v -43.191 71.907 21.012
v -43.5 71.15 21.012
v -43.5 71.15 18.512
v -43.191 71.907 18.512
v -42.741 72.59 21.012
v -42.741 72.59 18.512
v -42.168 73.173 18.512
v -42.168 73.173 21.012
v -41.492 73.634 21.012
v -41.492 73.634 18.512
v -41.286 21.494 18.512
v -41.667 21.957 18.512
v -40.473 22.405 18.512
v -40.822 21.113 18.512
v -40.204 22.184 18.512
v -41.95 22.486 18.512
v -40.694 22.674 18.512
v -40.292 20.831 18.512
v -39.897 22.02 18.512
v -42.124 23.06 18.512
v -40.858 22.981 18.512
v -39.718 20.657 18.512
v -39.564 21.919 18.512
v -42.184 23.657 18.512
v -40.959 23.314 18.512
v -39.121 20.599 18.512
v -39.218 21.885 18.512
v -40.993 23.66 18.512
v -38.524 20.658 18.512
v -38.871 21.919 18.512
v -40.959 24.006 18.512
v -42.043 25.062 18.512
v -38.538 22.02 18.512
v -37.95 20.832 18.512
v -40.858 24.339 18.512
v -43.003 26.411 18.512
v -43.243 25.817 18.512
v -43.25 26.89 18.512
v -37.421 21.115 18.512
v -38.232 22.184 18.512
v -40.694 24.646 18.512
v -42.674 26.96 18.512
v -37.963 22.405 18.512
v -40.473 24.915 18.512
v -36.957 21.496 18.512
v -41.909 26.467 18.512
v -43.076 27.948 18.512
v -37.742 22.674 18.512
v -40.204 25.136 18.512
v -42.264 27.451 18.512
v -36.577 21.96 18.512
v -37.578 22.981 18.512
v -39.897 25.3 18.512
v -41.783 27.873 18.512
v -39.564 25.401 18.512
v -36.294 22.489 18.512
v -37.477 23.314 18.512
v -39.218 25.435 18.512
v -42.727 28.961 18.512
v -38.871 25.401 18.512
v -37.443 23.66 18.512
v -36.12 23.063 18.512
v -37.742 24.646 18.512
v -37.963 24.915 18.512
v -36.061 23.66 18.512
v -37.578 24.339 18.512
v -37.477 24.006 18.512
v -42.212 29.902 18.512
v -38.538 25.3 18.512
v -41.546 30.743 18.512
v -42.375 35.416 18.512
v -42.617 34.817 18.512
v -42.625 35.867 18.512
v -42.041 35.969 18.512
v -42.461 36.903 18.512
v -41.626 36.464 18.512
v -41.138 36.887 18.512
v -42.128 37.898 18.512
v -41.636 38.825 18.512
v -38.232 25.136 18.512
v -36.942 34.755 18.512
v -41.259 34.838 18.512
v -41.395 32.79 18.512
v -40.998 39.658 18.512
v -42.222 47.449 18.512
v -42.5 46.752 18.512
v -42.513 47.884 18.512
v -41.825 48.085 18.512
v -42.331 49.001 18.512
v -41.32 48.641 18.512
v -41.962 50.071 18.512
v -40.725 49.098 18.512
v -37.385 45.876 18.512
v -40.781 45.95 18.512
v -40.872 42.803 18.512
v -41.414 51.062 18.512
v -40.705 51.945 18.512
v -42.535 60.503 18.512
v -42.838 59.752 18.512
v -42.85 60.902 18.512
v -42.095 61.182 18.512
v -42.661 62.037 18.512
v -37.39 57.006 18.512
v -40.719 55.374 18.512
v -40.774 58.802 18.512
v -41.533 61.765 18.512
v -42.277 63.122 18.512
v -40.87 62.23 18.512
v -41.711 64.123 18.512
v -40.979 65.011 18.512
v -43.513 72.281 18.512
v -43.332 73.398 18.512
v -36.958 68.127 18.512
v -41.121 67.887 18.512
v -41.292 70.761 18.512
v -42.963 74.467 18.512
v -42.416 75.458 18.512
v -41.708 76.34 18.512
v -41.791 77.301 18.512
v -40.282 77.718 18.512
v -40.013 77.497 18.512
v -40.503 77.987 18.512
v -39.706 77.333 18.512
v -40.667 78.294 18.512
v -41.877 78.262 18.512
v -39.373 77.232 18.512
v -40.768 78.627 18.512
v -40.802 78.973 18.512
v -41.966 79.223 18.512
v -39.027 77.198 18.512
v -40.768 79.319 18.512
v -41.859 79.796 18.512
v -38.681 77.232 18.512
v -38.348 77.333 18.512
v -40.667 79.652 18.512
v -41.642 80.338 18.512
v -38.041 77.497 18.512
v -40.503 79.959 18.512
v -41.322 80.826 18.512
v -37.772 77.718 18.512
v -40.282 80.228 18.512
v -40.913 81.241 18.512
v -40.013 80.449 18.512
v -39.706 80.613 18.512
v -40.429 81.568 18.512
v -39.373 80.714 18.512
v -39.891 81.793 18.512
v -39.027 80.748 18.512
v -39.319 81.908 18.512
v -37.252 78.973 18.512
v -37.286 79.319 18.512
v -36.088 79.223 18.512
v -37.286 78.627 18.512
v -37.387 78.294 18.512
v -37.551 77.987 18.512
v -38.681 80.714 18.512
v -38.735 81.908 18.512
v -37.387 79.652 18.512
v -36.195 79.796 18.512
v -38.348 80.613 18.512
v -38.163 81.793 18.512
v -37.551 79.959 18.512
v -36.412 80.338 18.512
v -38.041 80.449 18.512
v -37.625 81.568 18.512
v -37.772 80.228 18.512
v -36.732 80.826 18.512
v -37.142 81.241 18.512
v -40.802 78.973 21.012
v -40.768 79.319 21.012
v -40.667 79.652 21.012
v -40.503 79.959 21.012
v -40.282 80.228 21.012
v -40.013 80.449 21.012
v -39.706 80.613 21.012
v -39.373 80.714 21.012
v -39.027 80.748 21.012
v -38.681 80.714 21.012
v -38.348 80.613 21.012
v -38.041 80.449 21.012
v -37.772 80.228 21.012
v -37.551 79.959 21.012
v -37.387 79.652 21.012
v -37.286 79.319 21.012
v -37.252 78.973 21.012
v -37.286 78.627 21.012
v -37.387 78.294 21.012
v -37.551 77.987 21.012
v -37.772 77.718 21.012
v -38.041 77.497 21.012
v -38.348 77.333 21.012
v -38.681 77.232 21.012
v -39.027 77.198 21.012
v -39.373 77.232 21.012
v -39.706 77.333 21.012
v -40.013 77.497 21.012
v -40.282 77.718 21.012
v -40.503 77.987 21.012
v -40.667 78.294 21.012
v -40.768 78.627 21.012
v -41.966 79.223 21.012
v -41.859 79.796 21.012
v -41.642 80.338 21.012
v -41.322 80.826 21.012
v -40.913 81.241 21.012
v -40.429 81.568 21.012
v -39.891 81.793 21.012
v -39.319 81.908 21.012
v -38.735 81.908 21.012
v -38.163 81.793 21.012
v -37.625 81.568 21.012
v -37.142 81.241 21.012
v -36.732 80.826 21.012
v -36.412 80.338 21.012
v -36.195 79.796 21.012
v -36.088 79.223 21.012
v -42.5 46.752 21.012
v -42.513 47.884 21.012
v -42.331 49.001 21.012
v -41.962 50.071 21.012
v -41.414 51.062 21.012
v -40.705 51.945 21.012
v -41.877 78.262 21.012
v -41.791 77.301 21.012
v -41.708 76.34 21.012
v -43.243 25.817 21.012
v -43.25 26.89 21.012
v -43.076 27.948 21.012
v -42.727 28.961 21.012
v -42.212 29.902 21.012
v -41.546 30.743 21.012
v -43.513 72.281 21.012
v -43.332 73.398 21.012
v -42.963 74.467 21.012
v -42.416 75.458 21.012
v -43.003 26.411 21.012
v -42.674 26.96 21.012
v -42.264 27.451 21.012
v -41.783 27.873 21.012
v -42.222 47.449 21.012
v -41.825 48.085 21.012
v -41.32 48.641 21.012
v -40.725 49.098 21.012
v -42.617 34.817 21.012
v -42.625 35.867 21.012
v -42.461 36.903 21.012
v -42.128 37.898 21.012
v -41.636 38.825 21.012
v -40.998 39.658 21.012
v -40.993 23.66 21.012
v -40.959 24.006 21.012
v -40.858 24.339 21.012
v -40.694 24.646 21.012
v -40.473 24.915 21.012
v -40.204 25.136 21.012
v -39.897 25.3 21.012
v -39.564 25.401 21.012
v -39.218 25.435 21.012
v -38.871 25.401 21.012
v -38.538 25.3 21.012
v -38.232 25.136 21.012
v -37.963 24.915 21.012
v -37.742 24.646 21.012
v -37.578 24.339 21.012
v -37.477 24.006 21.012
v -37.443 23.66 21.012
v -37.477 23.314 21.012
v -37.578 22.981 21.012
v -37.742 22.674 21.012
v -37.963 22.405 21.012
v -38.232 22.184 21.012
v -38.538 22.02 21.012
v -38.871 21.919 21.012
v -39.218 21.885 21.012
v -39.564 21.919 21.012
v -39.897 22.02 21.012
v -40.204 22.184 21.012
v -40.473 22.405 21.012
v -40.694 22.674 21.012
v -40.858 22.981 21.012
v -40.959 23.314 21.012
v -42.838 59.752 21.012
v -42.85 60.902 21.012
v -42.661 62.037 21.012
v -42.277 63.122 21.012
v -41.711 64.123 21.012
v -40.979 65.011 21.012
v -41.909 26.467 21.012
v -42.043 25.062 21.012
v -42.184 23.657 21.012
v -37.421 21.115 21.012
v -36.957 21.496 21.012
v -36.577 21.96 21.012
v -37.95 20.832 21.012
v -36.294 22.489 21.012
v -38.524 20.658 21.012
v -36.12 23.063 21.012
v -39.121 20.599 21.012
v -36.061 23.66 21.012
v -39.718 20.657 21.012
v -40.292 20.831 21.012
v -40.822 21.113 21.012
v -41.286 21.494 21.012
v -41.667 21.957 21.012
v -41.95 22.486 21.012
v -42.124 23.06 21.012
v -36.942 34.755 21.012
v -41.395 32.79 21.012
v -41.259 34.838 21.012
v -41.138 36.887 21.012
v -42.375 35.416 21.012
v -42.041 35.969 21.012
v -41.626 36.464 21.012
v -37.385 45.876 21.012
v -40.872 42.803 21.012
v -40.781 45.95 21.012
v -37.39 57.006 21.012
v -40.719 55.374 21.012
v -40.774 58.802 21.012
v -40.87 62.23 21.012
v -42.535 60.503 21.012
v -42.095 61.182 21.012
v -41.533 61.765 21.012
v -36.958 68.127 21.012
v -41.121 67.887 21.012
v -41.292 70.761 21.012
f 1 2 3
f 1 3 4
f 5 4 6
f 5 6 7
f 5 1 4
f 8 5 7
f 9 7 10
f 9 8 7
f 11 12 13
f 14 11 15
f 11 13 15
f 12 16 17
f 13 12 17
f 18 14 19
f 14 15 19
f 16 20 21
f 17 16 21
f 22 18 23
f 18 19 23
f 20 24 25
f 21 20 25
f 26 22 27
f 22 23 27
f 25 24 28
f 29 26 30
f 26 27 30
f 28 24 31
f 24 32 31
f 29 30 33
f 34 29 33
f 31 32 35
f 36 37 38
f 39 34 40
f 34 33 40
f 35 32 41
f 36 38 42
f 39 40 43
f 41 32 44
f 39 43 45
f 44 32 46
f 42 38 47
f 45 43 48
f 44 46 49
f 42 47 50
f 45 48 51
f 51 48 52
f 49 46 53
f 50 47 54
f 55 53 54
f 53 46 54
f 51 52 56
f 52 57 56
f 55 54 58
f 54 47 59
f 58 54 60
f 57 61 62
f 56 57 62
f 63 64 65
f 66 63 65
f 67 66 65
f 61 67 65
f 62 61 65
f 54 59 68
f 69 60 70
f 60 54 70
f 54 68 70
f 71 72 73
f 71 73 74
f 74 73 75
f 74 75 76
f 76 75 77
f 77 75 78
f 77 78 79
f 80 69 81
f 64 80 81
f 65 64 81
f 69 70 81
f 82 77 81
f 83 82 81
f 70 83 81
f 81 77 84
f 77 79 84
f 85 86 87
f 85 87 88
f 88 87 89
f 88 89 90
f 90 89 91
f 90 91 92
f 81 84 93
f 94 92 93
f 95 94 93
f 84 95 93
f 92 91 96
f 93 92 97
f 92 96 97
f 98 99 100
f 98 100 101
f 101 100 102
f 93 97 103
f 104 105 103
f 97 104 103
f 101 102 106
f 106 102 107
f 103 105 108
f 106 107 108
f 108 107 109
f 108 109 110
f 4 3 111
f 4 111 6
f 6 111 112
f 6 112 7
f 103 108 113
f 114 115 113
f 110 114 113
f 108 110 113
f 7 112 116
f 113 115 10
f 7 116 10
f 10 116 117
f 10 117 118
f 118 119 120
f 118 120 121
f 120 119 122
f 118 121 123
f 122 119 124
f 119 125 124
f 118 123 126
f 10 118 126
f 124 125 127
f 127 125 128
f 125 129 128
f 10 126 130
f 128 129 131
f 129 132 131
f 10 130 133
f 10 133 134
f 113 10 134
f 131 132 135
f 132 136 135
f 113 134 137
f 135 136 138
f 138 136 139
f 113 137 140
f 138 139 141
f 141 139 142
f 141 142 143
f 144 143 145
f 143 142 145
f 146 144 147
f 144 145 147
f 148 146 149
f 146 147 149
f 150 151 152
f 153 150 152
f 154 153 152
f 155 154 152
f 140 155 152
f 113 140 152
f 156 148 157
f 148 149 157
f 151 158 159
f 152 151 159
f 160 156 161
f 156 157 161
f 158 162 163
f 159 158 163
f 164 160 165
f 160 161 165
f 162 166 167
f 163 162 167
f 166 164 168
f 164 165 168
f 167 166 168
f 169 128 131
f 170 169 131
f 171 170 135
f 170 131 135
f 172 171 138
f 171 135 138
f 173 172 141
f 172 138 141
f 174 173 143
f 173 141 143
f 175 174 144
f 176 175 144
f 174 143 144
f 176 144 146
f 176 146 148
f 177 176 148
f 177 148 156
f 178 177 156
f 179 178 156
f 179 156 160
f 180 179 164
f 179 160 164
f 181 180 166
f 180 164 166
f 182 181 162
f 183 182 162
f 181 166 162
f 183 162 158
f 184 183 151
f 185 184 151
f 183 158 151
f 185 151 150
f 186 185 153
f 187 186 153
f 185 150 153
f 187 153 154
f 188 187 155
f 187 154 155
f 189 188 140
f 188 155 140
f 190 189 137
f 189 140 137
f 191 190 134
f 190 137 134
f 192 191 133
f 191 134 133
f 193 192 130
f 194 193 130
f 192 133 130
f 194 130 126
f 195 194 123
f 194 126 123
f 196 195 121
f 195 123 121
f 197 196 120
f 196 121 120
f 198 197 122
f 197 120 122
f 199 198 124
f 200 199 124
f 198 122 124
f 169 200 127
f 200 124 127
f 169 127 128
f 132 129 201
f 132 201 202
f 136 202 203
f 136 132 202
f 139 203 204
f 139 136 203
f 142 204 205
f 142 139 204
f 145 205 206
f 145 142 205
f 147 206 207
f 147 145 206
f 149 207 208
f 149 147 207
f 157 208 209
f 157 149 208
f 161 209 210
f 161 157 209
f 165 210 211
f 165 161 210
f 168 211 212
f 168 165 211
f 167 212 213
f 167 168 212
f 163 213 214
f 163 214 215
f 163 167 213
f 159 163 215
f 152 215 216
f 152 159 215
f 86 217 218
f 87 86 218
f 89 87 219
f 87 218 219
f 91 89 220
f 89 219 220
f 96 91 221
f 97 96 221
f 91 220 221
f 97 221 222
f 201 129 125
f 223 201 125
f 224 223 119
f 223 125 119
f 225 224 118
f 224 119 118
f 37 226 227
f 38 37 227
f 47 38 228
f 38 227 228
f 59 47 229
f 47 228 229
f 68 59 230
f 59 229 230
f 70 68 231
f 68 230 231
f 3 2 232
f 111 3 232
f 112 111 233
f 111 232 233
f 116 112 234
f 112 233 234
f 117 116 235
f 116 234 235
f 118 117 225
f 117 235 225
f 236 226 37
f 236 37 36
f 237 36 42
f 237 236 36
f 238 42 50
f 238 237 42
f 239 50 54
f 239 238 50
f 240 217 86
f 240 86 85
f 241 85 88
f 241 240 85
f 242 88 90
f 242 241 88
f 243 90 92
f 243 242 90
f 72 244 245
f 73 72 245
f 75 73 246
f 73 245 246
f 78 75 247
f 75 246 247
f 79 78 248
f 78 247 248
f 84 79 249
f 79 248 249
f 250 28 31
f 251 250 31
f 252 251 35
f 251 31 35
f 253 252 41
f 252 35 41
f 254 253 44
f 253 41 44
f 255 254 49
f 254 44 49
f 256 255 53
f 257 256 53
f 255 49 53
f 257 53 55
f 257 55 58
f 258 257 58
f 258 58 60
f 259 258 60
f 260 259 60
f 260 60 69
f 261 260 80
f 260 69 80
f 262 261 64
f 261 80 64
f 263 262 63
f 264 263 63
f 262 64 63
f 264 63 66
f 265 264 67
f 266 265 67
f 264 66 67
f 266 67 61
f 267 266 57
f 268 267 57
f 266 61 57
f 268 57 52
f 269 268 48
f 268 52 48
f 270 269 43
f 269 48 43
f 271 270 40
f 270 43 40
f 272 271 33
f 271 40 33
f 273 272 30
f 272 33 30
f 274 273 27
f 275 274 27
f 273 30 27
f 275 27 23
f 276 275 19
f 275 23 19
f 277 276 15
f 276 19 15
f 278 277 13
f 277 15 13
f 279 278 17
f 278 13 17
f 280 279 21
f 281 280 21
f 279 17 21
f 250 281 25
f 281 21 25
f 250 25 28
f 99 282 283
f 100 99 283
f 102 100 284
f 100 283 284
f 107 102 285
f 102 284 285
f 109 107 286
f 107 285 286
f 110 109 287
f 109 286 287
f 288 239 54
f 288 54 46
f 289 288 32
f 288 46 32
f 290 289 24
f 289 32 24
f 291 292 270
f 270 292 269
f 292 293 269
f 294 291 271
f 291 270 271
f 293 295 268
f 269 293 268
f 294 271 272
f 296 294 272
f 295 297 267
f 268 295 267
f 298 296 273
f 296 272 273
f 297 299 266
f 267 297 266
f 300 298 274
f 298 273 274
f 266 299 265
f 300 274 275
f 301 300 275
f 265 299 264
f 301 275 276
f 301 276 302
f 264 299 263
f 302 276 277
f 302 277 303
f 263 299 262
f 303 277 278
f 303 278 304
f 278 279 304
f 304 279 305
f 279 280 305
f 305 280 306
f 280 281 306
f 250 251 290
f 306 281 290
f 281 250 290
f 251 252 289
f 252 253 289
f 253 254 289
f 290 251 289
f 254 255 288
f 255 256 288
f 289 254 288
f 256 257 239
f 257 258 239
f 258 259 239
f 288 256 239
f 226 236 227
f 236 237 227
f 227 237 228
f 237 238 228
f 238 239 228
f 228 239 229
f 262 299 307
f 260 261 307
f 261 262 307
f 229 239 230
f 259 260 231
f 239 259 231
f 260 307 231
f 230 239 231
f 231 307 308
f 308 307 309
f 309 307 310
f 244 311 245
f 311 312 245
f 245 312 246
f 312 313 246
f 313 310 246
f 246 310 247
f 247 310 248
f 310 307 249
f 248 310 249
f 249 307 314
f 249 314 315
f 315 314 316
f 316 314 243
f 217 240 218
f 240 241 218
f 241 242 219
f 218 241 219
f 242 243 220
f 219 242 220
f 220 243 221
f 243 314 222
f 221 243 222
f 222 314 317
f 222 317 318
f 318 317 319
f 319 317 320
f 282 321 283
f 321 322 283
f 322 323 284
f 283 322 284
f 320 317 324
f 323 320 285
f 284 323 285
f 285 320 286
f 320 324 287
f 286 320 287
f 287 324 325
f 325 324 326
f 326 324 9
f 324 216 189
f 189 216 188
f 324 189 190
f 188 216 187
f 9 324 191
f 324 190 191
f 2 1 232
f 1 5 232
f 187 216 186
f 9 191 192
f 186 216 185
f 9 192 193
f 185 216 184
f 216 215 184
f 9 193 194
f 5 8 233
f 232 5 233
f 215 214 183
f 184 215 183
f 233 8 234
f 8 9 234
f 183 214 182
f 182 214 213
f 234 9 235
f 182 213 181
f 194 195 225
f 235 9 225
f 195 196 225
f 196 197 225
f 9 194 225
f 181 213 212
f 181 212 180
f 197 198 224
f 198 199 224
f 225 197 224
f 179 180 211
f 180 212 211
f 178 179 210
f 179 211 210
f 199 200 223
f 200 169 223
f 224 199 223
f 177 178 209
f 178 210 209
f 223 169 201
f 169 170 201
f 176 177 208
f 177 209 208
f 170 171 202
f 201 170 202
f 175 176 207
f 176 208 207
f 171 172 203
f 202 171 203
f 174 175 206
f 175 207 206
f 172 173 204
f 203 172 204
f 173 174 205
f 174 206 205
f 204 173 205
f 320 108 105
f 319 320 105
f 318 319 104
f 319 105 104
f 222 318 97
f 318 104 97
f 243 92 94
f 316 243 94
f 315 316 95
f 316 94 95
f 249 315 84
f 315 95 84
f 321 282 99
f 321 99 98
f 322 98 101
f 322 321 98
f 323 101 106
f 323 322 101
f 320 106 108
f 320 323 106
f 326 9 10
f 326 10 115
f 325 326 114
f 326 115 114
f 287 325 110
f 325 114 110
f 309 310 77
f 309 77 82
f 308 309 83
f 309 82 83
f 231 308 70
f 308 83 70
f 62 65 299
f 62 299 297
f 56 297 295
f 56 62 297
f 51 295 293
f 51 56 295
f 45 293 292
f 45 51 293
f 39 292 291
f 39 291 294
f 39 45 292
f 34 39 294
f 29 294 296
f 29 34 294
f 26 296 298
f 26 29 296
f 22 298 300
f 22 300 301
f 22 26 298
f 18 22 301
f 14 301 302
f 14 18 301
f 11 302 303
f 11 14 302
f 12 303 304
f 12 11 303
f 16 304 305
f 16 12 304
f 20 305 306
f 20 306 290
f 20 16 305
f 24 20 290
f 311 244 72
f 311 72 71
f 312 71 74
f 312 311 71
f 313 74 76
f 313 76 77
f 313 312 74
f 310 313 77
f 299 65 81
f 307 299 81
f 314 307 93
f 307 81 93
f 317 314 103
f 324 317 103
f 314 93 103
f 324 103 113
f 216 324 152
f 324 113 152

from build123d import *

# Parameters (mm, degrees)
SKETCH048_R  = 1.775161
PAD043_DEPTH = 2.5
PAD044_DEPTH = 2.5


with BuildPart() as right_assembly_insect_leg_chain:
    # Sketch048 → Pad043 (new body)
    with BuildSketch(Plane(origin=(21.5, 17, 18.5124), x_dir=(1, 0, 0), z_dir=(0, 0, 1))):
        with BuildLine():
            ThreePointArc((14.5613, 6.51014), (15.942406, 34.290704), (14.588209, 62.072593))
            ThreePointArc((20.466069, 62.072593), (17.527139, 64.772596), (14.588209, 62.072593))
            ThreePointArc((20.466069, 62.072593), (19.206566, 34.284518), (20.683621, 6.507156))
            ThreePointArc((14.5613, 6.51014), (17.620969, 3.448525), (20.683621, 6.507156))
        make_face()
        with Locations((17.527139, 61.823095)):
            Circle(SKETCH048_R, mode=Mode.SUBTRACT)
        with Locations((17.717781, 6.510143)):
            Circle(SKETCH048_R, mode=Mode.SUBTRACT)
    extrude(amount=PAD043_DEPTH)

    # Sketch060 → Pad044 (new body)
    with BuildSketch(Plane(origin=(21.5, 17, 21.0124), x_dir=(1, 0, 0), z_dir=(0, 0, 1))):
        with BuildLine():
            Line((20.000001, 59.398018), (18.351276, 59.398018))
            Line((18.351276, 59.398018), (16.30761, 56.651009))
            Line((16.30761, 56.651009), (16.30761, 42.307617))
            Line((16.30761, 42.307617), (16.30761, 26.311142))
            Line((16.30761, 26.311142), (16.30761, 16.418461))
            Line((16.30761, 16.418461), (18, 11.53899))
            ThreePointArc((21.743425, 8.667282), (20.323658, 10.692271), (18, 11.53899))
            ThreePointArc((21.743425, 8.667282), (21.321037, 11.586215), (19.626274, 14))
            Line((19.626274, 14), (17.339302, 20.540378))
            ThreePointArc((21.117151, 17.667282), (19.683694, 19.702728), (17.339302, 20.540378))
            ThreePointArc((21.117151, 17.667282), (20.694763, 20.586215), (19, 23))
            Line((19, 23), (16.999998, 32.601983))
            ThreePointArc((21, 29.601985), (19.494884, 31.761832), (16.999998, 32.601983))
            ThreePointArc((21, 29.601985), (20.620642, 32.530944), (19, 35))
            Line((19, 35), (17, 45.62257))
            ThreePointArc((21.338368, 42.601985), (19.698982, 44.873209), (17, 45.62257))
            ThreePointArc((21.338368, 42.601985), (20.95901, 45.530944), (19.338368, 48))
            Line((19.338368, 48), (18, 57.000001))
            ThreePointArc((22.000001, 54.000003), (20.494886, 56.159849), (18, 57.000001))
            ThreePointArc((22.000001, 54.000003), (21.620643, 56.928962), (20.000001, 59.398018))
        make_face()
    extrude(amount=-PAD044_DEPTH)


with BuildPart() as part_mirroring007:
    # Part__Mirroring007: instance of right_assembly_insect_leg_chain
    add(right_assembly_insect_leg_chain.part.mirror(Plane(origin=(0, 0, 0), x_dir=(0, -1, 0), z_dir=(1, 0, 0))))


with BuildPart() as part_mirroring007_1:
    # Part__Mirroring007 placement: moved
    add(part_mirroring007.part.moved(Location((0, 0.15, 0))))


solid = part_mirroring007_1.part
